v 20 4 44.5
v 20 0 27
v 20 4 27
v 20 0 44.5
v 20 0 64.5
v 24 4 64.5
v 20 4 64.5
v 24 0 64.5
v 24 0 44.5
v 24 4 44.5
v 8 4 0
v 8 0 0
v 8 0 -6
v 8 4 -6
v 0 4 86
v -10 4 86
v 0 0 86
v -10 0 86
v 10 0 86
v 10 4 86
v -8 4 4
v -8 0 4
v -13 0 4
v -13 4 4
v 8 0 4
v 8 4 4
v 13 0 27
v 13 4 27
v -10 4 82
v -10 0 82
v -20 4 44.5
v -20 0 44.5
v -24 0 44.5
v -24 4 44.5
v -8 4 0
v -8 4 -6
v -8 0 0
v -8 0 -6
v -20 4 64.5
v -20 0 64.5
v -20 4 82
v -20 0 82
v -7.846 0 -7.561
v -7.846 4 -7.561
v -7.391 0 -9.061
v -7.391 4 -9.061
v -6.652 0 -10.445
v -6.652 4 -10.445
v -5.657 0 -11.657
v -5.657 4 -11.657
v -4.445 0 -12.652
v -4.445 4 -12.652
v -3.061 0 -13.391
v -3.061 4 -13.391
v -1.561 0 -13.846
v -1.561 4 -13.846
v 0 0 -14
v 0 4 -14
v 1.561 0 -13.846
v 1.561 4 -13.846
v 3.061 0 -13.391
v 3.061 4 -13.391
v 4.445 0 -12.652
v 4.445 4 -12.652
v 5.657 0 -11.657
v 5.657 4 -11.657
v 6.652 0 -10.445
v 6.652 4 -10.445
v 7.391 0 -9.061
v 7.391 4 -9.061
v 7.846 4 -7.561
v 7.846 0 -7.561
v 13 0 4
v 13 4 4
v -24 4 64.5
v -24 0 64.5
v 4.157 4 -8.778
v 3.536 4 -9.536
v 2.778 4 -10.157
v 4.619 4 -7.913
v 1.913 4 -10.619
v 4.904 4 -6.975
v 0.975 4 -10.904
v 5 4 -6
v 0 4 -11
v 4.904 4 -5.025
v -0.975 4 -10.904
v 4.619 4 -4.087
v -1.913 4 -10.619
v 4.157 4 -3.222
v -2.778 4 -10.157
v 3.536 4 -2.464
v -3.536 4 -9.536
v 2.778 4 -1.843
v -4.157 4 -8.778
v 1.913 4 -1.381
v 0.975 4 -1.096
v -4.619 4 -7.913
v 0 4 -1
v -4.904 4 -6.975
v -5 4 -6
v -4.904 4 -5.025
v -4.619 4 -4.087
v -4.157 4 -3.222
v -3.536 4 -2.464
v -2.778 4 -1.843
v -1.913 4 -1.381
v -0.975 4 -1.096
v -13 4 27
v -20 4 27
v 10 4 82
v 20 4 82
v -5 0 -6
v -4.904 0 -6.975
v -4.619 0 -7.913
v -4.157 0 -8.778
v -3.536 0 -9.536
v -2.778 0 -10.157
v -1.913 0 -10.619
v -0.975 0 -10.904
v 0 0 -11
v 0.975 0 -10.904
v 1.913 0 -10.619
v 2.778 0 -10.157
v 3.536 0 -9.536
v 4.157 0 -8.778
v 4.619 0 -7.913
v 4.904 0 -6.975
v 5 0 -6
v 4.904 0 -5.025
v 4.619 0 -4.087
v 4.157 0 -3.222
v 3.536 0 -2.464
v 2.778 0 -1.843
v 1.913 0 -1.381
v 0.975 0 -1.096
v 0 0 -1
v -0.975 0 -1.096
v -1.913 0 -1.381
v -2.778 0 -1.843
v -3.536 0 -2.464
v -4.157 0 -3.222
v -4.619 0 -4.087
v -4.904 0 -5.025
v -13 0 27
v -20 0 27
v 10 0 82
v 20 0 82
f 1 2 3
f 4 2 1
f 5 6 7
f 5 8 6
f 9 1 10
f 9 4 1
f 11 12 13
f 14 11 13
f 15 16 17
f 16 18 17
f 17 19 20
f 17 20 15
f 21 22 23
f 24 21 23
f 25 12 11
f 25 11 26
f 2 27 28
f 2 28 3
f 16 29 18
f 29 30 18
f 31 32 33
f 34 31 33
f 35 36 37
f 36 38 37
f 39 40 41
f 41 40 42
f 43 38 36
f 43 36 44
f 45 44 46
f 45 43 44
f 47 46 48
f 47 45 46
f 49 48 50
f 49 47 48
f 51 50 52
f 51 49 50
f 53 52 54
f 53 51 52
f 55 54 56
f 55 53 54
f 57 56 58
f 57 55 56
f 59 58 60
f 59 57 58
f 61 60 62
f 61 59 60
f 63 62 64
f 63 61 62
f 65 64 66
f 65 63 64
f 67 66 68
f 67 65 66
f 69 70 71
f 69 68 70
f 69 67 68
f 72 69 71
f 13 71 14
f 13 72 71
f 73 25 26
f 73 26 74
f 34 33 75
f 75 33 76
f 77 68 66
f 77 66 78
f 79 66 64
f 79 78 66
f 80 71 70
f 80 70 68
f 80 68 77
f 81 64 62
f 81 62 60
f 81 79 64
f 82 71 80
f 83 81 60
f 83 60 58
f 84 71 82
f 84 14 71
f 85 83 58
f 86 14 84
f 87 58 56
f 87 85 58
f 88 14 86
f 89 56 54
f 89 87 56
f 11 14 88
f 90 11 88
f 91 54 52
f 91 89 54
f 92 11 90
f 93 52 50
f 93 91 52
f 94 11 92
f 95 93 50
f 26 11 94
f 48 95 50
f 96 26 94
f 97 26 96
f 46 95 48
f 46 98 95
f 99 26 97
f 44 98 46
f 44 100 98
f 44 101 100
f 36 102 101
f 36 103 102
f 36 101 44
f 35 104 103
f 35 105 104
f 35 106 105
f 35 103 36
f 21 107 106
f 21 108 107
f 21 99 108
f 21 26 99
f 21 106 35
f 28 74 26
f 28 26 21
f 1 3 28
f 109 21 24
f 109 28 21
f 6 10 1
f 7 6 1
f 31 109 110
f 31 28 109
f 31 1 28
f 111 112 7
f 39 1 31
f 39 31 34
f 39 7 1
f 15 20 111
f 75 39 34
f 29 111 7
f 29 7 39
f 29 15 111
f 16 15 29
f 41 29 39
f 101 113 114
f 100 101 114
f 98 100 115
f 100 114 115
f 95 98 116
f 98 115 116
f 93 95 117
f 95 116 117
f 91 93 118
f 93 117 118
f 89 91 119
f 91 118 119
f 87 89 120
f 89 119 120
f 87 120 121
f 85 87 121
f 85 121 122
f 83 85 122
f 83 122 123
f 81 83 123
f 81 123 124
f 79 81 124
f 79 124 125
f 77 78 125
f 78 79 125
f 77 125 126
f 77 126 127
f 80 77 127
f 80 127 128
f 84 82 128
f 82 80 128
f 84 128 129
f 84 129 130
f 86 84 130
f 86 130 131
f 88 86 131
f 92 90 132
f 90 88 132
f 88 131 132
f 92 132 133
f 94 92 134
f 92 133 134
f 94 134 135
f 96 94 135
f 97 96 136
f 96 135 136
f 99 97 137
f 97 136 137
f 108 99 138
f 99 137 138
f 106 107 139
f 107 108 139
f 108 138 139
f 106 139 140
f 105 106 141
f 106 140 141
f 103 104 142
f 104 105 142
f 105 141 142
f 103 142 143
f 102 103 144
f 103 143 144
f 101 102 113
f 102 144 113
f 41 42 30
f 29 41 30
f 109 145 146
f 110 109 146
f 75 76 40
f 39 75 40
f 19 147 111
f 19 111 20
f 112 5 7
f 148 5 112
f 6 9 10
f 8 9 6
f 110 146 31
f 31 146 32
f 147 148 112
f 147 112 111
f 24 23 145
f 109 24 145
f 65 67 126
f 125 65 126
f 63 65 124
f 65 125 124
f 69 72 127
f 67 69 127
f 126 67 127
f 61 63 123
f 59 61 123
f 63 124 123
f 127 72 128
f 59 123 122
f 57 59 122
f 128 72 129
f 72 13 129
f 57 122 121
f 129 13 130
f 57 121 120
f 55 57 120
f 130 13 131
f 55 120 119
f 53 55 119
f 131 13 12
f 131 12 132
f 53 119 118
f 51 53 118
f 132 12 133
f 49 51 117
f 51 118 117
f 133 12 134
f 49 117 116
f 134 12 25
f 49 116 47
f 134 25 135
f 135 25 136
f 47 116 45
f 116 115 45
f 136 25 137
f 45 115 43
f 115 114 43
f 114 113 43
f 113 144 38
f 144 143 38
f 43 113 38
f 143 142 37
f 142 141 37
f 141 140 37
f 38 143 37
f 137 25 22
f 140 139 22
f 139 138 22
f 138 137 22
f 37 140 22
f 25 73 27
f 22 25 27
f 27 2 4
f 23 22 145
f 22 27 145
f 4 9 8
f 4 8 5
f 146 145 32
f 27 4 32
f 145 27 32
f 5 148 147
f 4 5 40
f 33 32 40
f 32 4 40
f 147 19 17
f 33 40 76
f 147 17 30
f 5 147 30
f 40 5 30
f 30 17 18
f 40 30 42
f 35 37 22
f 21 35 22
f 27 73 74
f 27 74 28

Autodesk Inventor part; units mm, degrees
ref_plane "YZ Plane" through (0, 0, 0) normal (1, 0, 0) x (0, 1, 0)
ref_plane "XZ Plane" through (0, 0, 0) normal (0, 1, 0) x (-1, 0, 0)
ref_plane "XY Plane" through (0, 0, 0) normal (0, 0, 1) x (1, 0, 0)
sketch "Эскиз1" plane through (0, 0, 0) normal (0, 1, 0) x (-1, 0, 0)
  line L0 (0, 0) -> (8, 0) construction
  line L1 (8, 0) -> (8, 4)
  line L2 (8, 4) -> (13, 4)
  line L3 (13, 4) -> (13, 27)
  line L4 (13, 27) -> (20, 27)
  line L5 (0, 0) -> (0, 86)
  line L6 (0, 0) -> (-8, 0) construction
  line L7 (-8, 0) -> (-8, 4)
  line L8 (-8, 4) -> (-13, 4)
  line L9 (-13, 4) -> (-13, 27)
  line L10 (-13, 27) -> (-20, 27)
  line L11 (20, 27) -> (20, 44.5)
  line L12 (20, 44.5) -> (24, 44.5)
  line L13 (24, 44.5) -> (24, 64.5)
  line L14 (24, 64.5) -> (20, 64.5)
  line L15 (-20, 27) -> (-20, 44.5)
  line L16 (-20, 44.5) -> (-24, 44.5)
  line L17 (-24, 44.5) -> (-24, 64.5)
  line L18 (-24, 64.5) -> (-20, 64.5)
  line L19 (20, 64.5) -> (20, 82)
  line L20 (20, 82) -> (10, 82)
  line L21 (10, 82) -> (10, 86)
  line L22 (10, 86) -> (0, 86)
  line L23 (-20, 64.5) -> (-20, 82)
  line L24 (-20, 82) -> (-10, 82)
  line L25 (-10, 82) -> (-10, 86)
  line L26 (-10, 86) -> (0, 86)
  line L27 (-8, 0) -> (-8, -6)
  line L28 (8, -6) -> (8, 0)
  arc A0 (-8, -6) -> (8, -6) centre (0, -6) ccw
  circle A1 centre (0, -6) radius 5
  dimension "d0" = 16
  dimension "d1" = 26
  dimension "d2" = 40
  dimension "d3" = 4
  dimension "d4" = 23
  dimension "d5" = 55
  dimension "d6" = 20
  dimension "d7" = 20
  dimension "d10" = 6
  dimension "d11" = 10
extrude "Выдавливание1" add sketch "Эскиз1" along normal blind 4
properties part number "PistonPart3" material "Дерево (вишня)"
